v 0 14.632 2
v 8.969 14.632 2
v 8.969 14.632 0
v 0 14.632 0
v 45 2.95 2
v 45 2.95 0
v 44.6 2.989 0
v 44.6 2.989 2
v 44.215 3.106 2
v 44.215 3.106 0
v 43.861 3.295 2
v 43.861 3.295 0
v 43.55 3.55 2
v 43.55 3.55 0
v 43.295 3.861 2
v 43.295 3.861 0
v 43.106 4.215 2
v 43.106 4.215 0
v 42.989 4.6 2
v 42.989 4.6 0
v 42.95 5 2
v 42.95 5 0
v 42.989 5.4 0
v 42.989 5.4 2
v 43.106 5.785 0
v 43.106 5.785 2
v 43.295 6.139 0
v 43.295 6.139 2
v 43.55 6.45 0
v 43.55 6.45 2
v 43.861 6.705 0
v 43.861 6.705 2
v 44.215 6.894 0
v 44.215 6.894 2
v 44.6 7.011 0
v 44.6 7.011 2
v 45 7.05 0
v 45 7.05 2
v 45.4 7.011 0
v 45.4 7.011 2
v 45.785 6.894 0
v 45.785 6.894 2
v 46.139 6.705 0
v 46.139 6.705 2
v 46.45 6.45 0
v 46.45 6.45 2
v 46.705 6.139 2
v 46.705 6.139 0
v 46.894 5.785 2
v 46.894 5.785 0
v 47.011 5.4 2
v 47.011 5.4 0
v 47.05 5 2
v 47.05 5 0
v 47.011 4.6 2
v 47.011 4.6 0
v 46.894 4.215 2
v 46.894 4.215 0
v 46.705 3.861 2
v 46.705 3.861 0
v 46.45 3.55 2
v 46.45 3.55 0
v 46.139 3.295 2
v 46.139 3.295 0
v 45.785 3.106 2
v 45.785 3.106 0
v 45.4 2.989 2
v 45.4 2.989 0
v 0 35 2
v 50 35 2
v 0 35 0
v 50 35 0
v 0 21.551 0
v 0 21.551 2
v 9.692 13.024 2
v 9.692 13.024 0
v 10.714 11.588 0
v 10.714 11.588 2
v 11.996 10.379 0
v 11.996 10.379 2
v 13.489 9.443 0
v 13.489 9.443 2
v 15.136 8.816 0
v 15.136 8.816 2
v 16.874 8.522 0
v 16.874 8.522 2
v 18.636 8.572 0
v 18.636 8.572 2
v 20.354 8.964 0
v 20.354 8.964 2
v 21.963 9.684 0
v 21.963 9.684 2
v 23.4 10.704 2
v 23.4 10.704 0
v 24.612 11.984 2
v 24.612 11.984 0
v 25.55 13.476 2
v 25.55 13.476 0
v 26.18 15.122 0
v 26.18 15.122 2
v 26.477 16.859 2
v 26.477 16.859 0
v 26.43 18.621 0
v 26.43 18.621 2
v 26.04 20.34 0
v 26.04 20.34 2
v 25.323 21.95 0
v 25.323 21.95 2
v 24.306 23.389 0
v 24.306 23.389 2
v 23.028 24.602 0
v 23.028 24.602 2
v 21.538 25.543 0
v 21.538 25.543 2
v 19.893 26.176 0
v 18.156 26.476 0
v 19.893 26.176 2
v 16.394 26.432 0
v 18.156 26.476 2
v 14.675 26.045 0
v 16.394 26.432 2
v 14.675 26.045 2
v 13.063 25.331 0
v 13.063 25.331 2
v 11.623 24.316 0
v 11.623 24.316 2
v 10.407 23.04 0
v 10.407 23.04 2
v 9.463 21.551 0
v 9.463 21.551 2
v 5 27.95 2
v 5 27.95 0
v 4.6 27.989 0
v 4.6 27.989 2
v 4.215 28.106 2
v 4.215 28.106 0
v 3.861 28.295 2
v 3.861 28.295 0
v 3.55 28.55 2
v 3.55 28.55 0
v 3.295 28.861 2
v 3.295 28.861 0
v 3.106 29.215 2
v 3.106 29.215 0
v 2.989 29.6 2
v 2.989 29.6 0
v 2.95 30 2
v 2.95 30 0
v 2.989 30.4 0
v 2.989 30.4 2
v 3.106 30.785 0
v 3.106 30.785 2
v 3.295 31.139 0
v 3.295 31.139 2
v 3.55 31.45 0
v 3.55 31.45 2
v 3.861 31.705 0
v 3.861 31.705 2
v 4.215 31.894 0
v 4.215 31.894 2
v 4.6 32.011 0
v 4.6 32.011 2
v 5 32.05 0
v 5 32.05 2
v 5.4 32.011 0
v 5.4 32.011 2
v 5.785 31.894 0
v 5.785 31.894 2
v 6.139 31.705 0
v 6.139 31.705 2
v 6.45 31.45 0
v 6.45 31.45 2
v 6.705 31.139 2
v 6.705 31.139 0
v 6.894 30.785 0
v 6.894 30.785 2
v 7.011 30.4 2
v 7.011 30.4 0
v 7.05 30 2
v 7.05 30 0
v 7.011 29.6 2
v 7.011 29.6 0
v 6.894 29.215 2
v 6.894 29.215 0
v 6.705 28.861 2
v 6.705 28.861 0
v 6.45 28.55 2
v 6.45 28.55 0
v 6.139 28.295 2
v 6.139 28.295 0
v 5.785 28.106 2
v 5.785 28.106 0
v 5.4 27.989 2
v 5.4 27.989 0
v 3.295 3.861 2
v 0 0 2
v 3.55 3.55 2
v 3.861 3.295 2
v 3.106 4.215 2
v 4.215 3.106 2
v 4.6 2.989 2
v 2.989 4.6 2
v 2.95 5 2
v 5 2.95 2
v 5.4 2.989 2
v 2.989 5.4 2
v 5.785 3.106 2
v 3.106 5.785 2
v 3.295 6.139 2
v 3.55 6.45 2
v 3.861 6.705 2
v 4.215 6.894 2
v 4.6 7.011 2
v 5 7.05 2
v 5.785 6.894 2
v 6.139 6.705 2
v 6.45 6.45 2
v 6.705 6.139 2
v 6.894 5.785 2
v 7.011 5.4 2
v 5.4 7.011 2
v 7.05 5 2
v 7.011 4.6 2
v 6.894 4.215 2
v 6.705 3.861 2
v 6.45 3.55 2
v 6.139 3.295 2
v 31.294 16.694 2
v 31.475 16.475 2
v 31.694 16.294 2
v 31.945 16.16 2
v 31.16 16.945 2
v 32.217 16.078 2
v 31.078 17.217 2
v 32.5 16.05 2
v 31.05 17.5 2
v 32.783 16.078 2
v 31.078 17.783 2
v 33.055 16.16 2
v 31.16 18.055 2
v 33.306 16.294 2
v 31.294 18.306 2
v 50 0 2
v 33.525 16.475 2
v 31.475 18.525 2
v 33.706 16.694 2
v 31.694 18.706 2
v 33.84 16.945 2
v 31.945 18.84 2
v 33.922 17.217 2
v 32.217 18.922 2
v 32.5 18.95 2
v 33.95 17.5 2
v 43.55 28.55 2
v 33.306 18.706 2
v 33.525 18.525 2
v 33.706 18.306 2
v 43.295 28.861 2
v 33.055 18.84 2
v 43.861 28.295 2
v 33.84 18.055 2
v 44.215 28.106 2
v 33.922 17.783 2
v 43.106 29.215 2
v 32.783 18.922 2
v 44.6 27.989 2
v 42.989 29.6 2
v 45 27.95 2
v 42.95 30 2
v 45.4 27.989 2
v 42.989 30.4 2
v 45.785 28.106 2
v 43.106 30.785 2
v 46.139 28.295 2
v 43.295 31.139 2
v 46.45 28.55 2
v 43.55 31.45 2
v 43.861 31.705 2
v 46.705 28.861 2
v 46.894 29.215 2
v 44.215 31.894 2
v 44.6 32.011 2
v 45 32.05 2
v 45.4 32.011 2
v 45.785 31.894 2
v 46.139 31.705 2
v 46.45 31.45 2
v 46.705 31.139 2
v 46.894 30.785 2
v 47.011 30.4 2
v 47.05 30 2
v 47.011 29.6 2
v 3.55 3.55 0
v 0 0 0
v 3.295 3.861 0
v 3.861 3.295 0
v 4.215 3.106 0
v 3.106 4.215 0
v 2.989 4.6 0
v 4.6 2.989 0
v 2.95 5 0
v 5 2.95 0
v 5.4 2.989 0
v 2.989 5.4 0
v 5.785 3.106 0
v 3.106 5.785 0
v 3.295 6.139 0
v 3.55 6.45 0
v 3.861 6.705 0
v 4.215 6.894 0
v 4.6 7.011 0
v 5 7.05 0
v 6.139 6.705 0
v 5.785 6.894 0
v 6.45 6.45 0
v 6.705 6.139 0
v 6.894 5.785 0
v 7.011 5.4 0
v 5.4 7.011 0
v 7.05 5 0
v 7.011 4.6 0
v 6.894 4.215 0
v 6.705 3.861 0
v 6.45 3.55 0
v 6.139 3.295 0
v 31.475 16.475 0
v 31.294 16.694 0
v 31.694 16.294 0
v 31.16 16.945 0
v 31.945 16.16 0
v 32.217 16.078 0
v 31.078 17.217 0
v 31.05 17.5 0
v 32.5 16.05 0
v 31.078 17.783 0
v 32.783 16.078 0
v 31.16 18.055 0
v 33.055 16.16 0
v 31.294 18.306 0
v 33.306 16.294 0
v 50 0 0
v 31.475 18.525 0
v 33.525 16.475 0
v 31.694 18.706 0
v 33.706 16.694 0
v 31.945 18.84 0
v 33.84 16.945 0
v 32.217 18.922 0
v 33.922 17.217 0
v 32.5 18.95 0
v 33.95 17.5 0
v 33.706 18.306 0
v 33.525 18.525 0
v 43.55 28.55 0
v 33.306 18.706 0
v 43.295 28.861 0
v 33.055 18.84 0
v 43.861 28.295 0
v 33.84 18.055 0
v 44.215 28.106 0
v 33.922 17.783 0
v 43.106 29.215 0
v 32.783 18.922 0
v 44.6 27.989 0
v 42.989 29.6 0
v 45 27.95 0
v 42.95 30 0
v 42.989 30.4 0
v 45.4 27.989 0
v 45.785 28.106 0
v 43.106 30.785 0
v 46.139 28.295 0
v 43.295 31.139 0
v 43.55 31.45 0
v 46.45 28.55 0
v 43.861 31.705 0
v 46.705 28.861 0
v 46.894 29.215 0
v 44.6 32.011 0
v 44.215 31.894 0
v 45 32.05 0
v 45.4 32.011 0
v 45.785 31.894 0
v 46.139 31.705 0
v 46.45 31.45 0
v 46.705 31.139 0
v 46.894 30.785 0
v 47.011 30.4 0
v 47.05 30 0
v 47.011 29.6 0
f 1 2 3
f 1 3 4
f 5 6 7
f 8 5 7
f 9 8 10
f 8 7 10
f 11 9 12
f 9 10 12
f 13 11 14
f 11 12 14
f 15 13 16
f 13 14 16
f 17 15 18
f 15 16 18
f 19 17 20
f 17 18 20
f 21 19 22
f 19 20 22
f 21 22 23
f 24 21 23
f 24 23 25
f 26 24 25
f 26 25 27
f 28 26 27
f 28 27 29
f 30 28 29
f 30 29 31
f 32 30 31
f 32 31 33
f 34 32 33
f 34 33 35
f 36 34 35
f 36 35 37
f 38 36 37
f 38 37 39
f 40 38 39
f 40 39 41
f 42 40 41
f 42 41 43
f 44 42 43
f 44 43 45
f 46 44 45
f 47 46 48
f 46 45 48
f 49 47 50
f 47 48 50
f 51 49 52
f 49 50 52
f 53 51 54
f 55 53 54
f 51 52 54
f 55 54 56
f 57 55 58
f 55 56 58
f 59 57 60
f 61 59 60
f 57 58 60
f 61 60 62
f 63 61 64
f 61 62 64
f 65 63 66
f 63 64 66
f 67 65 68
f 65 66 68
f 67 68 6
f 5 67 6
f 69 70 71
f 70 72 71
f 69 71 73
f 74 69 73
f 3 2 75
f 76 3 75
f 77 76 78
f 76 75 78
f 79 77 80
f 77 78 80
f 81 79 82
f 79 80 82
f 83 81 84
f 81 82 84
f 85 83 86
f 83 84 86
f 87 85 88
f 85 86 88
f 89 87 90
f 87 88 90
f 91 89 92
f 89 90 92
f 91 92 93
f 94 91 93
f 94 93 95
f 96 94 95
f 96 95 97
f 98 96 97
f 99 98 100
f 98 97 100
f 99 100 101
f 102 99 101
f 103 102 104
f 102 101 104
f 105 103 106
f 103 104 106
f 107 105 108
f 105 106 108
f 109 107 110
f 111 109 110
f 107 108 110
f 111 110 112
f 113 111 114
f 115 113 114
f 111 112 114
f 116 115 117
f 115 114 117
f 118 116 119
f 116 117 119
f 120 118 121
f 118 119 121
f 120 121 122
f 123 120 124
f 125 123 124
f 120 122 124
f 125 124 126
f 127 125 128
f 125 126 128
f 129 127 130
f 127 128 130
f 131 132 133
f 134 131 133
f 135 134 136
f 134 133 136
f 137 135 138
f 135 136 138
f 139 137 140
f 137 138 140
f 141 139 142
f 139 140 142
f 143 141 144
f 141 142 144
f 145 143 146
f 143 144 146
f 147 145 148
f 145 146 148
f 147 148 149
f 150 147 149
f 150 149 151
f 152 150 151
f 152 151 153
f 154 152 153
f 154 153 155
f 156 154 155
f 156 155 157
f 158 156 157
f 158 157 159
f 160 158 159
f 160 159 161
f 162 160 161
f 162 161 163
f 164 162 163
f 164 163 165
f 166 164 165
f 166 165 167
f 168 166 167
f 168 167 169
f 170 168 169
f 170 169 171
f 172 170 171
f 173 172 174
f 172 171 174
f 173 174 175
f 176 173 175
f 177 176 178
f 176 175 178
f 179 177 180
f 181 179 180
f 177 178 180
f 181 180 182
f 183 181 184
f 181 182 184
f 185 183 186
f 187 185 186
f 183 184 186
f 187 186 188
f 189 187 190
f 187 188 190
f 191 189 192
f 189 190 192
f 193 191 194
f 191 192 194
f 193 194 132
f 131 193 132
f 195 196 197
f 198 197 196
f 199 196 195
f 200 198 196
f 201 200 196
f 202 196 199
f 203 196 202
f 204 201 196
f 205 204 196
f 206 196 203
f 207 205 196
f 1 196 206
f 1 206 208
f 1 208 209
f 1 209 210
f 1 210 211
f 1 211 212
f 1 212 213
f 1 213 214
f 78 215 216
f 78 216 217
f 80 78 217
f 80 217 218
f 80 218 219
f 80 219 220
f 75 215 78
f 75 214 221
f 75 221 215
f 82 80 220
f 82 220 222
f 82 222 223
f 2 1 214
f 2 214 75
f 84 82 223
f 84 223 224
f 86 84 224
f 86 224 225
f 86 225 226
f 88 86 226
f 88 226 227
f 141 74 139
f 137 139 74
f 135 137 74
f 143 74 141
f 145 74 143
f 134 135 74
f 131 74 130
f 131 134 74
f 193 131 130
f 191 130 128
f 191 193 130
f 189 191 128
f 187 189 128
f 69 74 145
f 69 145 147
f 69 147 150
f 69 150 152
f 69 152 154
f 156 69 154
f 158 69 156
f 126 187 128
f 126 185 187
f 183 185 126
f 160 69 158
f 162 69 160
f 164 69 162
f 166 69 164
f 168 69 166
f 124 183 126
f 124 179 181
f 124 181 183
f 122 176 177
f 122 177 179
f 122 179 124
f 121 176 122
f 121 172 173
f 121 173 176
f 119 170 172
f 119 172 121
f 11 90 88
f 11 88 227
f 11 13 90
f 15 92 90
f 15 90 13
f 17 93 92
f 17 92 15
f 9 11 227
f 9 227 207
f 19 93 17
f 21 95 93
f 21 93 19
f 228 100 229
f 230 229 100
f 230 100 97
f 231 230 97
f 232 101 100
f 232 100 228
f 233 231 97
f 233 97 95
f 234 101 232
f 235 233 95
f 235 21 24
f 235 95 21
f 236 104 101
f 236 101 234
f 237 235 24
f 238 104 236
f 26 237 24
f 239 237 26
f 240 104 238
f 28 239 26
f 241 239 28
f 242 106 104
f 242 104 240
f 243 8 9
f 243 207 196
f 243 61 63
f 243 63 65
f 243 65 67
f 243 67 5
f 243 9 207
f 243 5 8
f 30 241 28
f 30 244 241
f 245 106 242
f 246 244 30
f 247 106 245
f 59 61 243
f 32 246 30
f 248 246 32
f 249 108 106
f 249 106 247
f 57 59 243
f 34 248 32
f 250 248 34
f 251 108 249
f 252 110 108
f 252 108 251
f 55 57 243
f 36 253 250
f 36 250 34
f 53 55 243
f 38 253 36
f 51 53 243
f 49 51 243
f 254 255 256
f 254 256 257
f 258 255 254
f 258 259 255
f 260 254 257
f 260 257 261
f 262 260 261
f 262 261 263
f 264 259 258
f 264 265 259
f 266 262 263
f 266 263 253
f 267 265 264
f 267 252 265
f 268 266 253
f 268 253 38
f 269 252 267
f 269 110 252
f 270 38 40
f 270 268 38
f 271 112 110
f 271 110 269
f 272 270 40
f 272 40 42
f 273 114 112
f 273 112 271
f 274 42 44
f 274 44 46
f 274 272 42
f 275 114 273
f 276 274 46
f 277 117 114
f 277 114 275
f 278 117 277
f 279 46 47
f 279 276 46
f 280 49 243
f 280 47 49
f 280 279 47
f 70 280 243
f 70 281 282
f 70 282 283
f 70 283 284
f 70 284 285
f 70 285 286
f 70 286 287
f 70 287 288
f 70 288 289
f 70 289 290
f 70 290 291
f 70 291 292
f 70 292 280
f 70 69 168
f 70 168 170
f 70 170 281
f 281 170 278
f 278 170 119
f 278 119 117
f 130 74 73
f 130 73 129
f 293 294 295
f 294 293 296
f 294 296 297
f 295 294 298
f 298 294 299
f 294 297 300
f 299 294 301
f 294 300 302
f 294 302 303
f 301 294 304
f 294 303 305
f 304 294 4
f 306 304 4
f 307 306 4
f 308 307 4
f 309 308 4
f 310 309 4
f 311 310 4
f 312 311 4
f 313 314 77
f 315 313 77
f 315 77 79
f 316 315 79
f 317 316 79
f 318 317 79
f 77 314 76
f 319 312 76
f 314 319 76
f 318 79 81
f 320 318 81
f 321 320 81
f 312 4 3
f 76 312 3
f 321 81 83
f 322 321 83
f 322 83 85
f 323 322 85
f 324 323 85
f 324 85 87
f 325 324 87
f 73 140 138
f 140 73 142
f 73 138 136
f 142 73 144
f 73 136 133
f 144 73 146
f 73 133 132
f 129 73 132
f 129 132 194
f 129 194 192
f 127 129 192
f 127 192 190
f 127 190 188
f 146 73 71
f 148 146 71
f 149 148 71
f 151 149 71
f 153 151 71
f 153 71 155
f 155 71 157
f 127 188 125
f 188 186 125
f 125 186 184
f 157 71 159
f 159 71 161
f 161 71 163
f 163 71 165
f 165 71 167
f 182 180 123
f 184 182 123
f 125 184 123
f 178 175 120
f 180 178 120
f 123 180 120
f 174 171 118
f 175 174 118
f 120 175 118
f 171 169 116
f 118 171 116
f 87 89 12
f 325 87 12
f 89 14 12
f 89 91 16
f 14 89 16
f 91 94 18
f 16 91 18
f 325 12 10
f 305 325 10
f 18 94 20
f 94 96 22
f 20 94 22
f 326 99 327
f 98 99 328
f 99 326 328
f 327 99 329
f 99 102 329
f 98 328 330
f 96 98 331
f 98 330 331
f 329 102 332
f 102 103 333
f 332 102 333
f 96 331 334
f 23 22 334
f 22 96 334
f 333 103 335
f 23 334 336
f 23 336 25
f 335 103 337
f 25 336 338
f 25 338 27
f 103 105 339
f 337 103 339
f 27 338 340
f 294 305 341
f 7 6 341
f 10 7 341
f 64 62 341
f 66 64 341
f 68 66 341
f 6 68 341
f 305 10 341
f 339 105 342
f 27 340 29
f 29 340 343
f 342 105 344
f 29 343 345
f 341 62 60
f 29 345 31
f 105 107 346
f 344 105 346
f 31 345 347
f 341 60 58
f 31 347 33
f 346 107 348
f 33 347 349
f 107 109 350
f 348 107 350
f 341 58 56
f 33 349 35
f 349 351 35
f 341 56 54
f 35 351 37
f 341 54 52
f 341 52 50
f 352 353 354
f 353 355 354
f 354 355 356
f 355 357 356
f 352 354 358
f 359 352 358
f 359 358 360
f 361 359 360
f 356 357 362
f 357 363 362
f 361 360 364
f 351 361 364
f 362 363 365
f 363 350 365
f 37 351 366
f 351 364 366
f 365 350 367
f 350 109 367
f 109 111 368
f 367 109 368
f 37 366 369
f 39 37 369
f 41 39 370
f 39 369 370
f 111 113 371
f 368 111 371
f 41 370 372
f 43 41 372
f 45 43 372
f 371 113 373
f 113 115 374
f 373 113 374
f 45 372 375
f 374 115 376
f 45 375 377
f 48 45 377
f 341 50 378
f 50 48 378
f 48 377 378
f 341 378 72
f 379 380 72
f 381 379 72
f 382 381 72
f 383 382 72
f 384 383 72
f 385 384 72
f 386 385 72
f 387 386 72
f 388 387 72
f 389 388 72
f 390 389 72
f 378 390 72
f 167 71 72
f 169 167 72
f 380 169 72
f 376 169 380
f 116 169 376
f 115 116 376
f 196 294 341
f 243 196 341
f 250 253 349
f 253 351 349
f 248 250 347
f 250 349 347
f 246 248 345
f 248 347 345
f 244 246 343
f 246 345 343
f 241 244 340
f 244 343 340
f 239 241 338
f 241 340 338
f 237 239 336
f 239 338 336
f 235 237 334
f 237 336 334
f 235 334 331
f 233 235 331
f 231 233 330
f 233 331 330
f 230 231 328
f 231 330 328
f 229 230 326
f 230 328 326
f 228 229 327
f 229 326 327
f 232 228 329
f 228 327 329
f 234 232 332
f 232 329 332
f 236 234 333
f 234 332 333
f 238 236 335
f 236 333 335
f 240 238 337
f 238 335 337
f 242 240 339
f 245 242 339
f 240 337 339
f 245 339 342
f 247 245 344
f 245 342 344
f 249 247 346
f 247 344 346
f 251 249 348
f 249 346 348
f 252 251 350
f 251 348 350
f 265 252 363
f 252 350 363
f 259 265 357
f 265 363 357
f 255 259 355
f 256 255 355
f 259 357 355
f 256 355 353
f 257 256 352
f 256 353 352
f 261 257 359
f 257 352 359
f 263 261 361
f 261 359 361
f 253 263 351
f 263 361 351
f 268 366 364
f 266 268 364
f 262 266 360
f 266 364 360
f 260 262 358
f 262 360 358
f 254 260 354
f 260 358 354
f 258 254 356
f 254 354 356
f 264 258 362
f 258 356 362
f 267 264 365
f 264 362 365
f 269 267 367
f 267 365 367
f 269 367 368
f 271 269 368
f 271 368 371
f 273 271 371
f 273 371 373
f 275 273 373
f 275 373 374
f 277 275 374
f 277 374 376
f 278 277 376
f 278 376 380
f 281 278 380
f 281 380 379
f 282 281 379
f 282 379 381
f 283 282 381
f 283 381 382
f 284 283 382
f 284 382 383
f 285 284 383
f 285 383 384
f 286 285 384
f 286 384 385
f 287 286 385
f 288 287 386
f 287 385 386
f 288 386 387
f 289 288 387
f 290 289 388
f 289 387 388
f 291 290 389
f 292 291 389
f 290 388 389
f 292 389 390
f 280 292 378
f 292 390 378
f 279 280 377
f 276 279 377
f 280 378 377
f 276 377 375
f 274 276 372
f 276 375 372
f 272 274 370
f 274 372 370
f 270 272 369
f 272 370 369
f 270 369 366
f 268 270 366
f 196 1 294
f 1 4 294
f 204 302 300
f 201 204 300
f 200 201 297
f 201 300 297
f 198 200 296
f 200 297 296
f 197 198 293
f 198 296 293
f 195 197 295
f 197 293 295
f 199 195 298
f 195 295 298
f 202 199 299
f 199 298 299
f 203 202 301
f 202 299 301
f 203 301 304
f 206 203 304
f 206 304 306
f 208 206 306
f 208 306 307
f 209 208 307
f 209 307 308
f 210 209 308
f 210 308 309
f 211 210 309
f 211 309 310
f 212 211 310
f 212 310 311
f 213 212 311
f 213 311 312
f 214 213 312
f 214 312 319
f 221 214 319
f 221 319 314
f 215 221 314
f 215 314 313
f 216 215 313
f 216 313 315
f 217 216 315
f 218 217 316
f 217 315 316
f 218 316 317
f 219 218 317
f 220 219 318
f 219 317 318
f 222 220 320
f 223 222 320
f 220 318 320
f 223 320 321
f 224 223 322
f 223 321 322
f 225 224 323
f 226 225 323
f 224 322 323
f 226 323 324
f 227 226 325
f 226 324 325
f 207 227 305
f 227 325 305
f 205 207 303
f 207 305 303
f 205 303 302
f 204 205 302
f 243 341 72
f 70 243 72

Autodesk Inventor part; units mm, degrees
ref_plane "YZ Plane" through (0, 0, 0) normal (1, 0, 0) x (0, 1, 0)
ref_plane "XZ Plane" through (0, 0, 0) normal (0, 1, 0) x (-1, 0, 0)
ref_plane "XY Plane" through (0, 0, 0) normal (0, 0, 1) x (1, 0, 0)
sketch "Skizze1" plane through (0, 0, 0) normal (0, 0, 1) x (1, 0, 0)
  line L0 (0, 0) -> (50, 0)
  line L1 (50, 0) -> (50, 35)
  line L2 (50, 35) -> (0, 35)
  line L3 (0, 35) -> (0, 0)
  circle A0 centre (17.5, 17.5) radius 1.05
  circle A1 centre (32.5, 17.5) radius 1.45
  line L4 (0, 17.5) -> (50, 17.5)
  line L5 (50, 0) -> (50, 17.5)
  line L6 (50, 17.5) -> (50, 35)
  line L7 (17.5, 17.5) -> (0, 17.5)
  line L8 (32.5, 17.5) -> (50, 17.5)
  dimension "d0" = 2.1
  dimension "d1" = 2.9
  dimension "d2" = 15
  dimension "d16" = 17.5
  dimension "d25" = 50
extrude "Extrusion1" add sketch "Skizze1" along normal blind 2 contours L3 L4 A0 A1 L1 L0 | L3 L2 L1 L4 A1 A0
sketch "Skizze5" plane through (0, 0, 2) normal (0, 0, 1) x (1, 0, 0)
  circle A0 centre (17.5, 17.5) radius 1.05 projected
  circle A1 centre (17.5, 17.5) radius 9
  line L0 (10.0196, 14.6319) -> (-2.5086, 14.6319)
  line L1 (-2.5086, 14.6319) -> (-2.5086, 21.5511)
  line L2 (-2.5086, 21.5511) -> (10.0196, 21.5511)
  line L3 (10.0196, 21.5511) -> (10.0196, 14.6319)
  circle A2 centre (17.5, 17.5) radius 7.5 projected
  dimension "d24" = 1.5
extrude "Extrusion5" cut sketch "Skizze5" against normal through all
sketch "Skizze6" plane through (0, 0, 2) normal (0, 0, 1) x (1, 0, 0)
  line L0 (0, 14.6319) -> (0, 0) projected
  line L1 (0, 0) -> (50, 0) projected
  line L2 (50, 0) -> (50, 35) projected
  line L3 (50, 35) -> (0, 35) projected
  line L4 (5, 30) -> (45, 30)
  line L5 (45, 30) -> (45, 5)
  line L6 (45, 5) -> (5, 5)
  line L7 (5, 5) -> (5, 30)
  dimension "d26" = 5
  dimension "d27" = 5
  dimension "d28" = 5
  dimension "d29" = 5
hole "Bohrung1" at (5, 5, 2) at (5, 30, 2) at (45, 30, 2) at (45, 5, 2) direction (0, 0, -1) diameter 4.1 end through all
properties part number "GehäuseFront"
